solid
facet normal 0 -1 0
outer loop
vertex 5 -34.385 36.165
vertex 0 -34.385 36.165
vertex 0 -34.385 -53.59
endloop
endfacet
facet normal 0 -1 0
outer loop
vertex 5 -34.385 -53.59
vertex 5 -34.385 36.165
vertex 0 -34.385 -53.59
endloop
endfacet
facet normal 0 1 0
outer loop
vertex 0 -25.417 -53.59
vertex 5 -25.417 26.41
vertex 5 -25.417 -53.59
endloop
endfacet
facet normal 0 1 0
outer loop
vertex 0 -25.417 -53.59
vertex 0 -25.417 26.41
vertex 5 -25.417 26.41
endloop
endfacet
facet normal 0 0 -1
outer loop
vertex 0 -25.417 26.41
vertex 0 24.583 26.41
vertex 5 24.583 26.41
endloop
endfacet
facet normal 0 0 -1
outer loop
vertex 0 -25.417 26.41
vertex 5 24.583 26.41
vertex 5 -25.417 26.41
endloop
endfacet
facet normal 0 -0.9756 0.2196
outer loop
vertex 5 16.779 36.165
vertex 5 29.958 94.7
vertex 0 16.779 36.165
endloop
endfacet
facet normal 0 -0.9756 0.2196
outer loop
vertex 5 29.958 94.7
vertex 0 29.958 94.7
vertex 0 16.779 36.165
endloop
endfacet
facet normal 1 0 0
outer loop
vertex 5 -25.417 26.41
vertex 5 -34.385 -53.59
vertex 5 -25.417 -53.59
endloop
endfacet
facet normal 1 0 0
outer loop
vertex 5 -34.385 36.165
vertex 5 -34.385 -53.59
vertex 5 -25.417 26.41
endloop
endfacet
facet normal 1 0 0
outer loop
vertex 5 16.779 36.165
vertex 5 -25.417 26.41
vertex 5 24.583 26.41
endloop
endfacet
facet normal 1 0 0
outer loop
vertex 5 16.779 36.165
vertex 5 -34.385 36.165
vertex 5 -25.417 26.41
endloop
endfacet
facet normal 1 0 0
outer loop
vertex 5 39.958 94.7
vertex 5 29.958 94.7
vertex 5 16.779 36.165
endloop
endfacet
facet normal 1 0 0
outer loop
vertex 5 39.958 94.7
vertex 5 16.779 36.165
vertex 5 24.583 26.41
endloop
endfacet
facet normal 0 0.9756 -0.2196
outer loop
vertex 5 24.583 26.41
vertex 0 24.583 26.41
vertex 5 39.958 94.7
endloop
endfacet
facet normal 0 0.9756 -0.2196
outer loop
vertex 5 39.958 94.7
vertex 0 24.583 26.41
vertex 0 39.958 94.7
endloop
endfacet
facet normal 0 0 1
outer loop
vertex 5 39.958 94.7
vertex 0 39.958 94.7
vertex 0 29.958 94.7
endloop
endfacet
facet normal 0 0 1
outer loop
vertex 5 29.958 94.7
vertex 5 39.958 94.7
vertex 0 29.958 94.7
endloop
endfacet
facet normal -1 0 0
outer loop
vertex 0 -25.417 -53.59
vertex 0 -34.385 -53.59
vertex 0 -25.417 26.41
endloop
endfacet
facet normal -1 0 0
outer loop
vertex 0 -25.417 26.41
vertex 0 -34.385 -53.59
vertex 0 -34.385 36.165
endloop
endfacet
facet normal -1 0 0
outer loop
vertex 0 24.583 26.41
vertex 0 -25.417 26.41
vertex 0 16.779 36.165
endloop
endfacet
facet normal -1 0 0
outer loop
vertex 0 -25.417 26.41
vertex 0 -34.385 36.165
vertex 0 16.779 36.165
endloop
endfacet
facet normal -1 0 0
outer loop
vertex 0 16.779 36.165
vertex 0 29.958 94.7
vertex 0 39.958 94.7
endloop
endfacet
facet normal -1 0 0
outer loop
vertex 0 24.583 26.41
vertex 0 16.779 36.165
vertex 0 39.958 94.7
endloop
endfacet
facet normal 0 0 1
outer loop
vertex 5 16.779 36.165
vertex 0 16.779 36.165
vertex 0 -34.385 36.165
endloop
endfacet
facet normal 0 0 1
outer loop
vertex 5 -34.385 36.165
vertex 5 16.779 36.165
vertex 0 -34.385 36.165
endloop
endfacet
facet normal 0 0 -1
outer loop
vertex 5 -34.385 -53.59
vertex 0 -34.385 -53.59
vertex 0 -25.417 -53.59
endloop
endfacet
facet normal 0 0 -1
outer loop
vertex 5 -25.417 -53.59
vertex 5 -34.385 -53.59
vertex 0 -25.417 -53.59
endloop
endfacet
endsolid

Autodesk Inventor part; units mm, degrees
ref_plane "YZ Plane" through (0, 0, 0) normal (1, 0, 0) x (0, 1, 0)
ref_plane "XZ Plane" through (0, 0, 0) normal (0, 1, 0) x (-1, 0, 0)
ref_plane "XY Plane" through (0, 0, 0) normal (0, 0, 1) x (1, 0, 0)
sketch "Esquisse1" plane through (0, 0, 0) normal (1, 0, 0) x (0, 1, 0)
  circle A0 centre (0, 0) radius 22.5 construction
  line L0 (24.5829, 26.4096) -> (-25.4171, 26.4096)
  line L1 (-25.4171, 26.4096) -> (-25.4171, -53.5904)
  line L2 (24.5829, 26.4096) -> (39.9583, 94.7002)
  line L3 (39.9583, 94.7002) -> (29.9583, 94.7002)
  line L4 (29.9583, 94.7002) -> (16.7794, 36.1654)
  line L5 (16.7794, 36.1654) -> (-34.3848, 36.1654)
  line L6 (-34.3848, 36.1654) -> (-34.3848, -53.5904)
  line L7 (-34.3848, -53.5904) -> (-25.4171, -53.5904)
  dimension "d0" = 45
  dimension "d1" = 50
  dimension "d2" = 80
  dimension "d3" = 70
  dimension "d4" = 10
  dimension "d5" = 60
  dimension "d6" = 102.688
  dimension "d7" = 102.688
  dimension "d8" = 51.1642
extrude "Extrusion1" add sketch "Esquisse1" along normal blind 5
